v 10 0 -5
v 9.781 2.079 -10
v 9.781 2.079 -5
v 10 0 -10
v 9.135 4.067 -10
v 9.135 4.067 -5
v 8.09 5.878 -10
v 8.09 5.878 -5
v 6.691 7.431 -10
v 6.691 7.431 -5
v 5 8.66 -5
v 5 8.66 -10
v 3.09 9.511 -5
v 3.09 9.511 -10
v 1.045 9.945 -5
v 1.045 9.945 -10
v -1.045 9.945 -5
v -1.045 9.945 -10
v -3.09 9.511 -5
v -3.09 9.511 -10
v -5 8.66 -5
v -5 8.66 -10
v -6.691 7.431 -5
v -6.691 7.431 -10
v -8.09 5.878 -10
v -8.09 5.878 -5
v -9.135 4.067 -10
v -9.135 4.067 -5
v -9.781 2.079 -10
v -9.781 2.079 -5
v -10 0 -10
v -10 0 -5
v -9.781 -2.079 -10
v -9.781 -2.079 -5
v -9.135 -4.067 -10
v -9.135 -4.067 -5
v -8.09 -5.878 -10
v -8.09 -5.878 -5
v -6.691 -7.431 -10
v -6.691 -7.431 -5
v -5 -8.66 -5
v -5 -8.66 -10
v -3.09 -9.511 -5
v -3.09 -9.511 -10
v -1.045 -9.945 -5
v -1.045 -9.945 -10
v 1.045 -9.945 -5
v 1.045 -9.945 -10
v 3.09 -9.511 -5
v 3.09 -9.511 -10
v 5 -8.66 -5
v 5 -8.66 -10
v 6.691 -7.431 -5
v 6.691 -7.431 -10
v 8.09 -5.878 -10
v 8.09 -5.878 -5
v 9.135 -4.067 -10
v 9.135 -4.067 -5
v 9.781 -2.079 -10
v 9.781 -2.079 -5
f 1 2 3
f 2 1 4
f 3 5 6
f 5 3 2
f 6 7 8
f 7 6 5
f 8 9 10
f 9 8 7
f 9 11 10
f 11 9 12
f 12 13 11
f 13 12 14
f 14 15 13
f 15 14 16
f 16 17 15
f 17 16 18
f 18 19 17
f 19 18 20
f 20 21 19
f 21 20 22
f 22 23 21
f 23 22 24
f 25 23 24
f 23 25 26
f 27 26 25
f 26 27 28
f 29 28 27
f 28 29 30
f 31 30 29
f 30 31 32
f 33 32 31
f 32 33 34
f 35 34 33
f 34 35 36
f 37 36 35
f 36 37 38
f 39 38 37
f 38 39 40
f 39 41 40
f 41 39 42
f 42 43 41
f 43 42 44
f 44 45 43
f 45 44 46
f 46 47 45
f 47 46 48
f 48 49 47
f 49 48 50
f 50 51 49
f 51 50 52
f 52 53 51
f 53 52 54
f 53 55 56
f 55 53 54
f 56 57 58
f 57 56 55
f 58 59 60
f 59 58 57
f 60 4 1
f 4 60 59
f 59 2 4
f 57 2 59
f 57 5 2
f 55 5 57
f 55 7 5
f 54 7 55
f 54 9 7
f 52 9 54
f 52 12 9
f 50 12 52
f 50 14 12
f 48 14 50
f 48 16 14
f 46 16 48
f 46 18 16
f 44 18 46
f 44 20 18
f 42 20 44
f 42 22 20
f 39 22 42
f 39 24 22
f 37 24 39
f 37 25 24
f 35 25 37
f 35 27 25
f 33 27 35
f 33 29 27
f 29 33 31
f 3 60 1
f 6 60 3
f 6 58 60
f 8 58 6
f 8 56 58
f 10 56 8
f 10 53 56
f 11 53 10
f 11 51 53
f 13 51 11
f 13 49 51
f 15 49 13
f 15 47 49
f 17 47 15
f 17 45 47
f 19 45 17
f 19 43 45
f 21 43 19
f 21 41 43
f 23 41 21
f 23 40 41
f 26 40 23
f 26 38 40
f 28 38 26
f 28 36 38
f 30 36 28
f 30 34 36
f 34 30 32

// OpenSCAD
// Generated by generate_scads.py
translate([0,0,-30]) {
  translate([0,0,20]) {
    intersection() {
      cylinder(h=5, r=10, center=false);
    }
  }
}
